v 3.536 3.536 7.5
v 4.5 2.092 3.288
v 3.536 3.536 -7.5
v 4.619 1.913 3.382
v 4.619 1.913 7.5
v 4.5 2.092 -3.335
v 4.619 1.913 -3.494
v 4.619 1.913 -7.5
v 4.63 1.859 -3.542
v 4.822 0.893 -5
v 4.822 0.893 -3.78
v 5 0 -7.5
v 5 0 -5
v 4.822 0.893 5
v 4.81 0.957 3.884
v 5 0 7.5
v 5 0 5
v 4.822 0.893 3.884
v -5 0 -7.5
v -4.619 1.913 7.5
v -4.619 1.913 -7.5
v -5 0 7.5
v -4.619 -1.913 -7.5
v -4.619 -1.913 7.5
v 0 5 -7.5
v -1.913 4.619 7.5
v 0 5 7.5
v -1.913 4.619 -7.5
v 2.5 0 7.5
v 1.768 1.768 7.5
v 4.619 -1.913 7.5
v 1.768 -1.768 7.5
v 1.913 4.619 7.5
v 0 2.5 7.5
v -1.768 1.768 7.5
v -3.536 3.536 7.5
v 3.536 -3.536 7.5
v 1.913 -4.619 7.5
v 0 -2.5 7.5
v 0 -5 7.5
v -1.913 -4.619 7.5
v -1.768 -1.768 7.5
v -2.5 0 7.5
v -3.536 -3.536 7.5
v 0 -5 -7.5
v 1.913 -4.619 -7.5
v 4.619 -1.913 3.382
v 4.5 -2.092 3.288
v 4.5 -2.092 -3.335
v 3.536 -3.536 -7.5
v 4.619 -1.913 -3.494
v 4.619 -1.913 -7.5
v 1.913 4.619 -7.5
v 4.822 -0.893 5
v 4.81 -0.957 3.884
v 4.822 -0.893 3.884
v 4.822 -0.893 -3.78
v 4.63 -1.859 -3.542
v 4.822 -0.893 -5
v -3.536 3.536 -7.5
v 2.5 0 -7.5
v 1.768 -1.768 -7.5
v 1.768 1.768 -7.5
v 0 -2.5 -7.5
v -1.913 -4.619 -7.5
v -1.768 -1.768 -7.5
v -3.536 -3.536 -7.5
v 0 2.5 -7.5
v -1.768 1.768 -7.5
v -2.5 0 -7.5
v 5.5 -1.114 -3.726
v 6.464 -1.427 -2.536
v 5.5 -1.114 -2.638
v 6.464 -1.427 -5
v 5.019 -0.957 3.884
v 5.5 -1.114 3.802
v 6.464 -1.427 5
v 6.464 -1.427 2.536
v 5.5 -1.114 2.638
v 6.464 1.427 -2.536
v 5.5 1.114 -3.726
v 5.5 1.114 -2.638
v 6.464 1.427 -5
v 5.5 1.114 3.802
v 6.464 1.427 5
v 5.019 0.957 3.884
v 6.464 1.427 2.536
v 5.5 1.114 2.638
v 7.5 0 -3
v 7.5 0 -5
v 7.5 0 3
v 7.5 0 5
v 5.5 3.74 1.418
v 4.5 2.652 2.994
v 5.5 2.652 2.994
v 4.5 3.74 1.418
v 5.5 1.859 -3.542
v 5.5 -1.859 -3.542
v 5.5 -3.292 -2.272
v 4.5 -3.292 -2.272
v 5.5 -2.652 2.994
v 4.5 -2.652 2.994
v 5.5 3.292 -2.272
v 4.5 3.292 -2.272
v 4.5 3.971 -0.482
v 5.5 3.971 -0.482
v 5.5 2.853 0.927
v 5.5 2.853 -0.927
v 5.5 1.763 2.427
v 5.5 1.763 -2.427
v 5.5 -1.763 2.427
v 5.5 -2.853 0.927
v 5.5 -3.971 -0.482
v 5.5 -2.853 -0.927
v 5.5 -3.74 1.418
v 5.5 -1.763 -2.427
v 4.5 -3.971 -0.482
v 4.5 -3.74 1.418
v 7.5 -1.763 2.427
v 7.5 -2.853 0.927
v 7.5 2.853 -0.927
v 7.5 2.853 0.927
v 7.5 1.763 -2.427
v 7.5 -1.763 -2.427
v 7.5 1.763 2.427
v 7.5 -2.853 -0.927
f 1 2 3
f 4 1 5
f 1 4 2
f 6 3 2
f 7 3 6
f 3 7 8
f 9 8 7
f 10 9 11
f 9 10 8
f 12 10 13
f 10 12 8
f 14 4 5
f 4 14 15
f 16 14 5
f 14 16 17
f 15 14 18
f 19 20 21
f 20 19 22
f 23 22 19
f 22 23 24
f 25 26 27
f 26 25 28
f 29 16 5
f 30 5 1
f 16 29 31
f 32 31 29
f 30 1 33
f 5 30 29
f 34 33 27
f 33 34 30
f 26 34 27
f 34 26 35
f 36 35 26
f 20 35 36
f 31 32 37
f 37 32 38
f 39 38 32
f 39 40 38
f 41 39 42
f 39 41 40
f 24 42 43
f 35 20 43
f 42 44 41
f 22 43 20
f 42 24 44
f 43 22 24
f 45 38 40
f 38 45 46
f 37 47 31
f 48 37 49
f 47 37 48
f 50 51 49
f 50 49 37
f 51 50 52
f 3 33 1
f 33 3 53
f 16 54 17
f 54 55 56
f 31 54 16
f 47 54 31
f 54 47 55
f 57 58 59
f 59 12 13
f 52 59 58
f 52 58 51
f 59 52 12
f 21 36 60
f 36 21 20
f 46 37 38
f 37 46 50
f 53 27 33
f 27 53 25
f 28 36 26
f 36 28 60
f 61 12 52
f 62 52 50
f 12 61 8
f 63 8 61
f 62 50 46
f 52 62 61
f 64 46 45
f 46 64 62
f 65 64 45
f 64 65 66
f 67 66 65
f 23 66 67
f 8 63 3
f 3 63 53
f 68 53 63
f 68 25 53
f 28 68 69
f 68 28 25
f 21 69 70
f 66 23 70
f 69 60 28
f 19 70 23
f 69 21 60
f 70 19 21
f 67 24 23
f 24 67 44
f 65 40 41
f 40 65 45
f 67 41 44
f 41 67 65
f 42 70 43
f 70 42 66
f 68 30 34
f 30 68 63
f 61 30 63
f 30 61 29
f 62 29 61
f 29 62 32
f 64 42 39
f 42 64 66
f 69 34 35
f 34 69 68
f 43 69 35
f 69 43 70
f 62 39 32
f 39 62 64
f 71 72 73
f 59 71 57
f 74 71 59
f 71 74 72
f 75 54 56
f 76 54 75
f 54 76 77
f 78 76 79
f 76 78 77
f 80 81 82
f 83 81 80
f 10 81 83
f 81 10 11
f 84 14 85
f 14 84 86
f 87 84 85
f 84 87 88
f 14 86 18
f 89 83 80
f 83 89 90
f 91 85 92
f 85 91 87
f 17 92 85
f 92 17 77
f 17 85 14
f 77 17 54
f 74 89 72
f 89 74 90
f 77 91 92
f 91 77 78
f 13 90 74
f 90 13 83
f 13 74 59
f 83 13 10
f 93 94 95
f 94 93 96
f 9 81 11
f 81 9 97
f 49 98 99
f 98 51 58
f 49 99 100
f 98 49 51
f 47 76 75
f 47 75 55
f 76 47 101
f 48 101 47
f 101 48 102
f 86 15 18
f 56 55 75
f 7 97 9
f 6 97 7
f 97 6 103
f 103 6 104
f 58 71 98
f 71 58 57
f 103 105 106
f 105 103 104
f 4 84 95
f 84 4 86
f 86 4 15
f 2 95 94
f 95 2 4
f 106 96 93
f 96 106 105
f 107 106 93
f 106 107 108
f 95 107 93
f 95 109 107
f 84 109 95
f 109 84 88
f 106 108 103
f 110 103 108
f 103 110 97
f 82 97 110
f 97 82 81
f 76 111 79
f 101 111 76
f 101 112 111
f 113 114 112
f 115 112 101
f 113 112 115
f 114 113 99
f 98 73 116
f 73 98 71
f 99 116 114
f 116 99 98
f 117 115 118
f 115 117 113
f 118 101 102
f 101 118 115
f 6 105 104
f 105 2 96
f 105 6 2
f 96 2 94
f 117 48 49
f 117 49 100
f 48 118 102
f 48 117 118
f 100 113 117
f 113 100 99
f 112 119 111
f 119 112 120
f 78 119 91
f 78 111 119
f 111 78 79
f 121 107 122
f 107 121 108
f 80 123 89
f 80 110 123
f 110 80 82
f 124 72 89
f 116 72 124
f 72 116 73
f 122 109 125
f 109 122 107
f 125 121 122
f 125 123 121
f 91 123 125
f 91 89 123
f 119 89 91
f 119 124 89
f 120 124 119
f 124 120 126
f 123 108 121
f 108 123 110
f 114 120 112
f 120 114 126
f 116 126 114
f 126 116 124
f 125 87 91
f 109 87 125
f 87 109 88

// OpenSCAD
// Parameters
bore_diameter_mm = 5; //[2.5:10:0.1]
outer_diameter_mm = 10; //[5:20:0.1]
length_mm = 15; //[7.5:30:0.1]
outer_radius_mm = 5; //[2.5:10:0.1]
inner_radius_mm = 2.5; //[1.25:5:0.1]
wall_thickness_mm = 2.5; //[1:5:0.1]
eps_mm = 0.5; //[0.1:2:0.1]
screw_shank_radius_mm = 1.5; //[0.75:3:0.1]
screw_length_mm = 10; //[5:20:0.1]
washer_outer_radius_mm = 4; //[2:8:0.1]
washer_thickness_mm = 1; //[0.5:3:0.1]
screw_head_radius_mm = 3; //[1.5:6:0.1]
screw_head_height_mm = 2; //[1:5:0.1]

// Linear Bearing - complete geometry
module linear_bearing() {
  color("DimGray") {
    difference() {
      // Outer cylinder
      cylinder(r=outer_diameter_mm/2, h=length_mm, center=true);
      // Inner bore
      translate([0, 0, -eps_mm])
        cylinder(r=bore_diameter_mm/2, h=length_mm + 2*eps_mm, center=true);
    }
  }
}

// Screw and Washer - complete geometry
module screw_and_washer() {
  color("Silver") {
    union() {
      // Screw shank
      translate([outer_diameter_mm/2 + screw_shank_radius_mm - eps_mm, 0, 0])
        cylinder(r=screw_shank_radius_mm, h=screw_length_mm, center=true);
      // Washer
      translate([outer_diameter_mm/2 + washer_thickness_mm/2 - eps_mm, 0, 0])
        rotate([0, 90, 0])
        cylinder(r=washer_outer_radius_mm, h=washer_thickness_mm, center=true);
      // Screw head
      translate([outer_diameter_mm/2 + washer_thickness_mm + screw_head_height_mm/2 - eps_mm, 0, 0])
        rotate([0, 90, 0])
        cylinder(r=screw_head_radius_mm, h=screw_head_height_mm, center=true);
    }
  }
}

// Assembly
module assembly() {
  linear_bearing();
  screw_and_washer();
}

assembly();
